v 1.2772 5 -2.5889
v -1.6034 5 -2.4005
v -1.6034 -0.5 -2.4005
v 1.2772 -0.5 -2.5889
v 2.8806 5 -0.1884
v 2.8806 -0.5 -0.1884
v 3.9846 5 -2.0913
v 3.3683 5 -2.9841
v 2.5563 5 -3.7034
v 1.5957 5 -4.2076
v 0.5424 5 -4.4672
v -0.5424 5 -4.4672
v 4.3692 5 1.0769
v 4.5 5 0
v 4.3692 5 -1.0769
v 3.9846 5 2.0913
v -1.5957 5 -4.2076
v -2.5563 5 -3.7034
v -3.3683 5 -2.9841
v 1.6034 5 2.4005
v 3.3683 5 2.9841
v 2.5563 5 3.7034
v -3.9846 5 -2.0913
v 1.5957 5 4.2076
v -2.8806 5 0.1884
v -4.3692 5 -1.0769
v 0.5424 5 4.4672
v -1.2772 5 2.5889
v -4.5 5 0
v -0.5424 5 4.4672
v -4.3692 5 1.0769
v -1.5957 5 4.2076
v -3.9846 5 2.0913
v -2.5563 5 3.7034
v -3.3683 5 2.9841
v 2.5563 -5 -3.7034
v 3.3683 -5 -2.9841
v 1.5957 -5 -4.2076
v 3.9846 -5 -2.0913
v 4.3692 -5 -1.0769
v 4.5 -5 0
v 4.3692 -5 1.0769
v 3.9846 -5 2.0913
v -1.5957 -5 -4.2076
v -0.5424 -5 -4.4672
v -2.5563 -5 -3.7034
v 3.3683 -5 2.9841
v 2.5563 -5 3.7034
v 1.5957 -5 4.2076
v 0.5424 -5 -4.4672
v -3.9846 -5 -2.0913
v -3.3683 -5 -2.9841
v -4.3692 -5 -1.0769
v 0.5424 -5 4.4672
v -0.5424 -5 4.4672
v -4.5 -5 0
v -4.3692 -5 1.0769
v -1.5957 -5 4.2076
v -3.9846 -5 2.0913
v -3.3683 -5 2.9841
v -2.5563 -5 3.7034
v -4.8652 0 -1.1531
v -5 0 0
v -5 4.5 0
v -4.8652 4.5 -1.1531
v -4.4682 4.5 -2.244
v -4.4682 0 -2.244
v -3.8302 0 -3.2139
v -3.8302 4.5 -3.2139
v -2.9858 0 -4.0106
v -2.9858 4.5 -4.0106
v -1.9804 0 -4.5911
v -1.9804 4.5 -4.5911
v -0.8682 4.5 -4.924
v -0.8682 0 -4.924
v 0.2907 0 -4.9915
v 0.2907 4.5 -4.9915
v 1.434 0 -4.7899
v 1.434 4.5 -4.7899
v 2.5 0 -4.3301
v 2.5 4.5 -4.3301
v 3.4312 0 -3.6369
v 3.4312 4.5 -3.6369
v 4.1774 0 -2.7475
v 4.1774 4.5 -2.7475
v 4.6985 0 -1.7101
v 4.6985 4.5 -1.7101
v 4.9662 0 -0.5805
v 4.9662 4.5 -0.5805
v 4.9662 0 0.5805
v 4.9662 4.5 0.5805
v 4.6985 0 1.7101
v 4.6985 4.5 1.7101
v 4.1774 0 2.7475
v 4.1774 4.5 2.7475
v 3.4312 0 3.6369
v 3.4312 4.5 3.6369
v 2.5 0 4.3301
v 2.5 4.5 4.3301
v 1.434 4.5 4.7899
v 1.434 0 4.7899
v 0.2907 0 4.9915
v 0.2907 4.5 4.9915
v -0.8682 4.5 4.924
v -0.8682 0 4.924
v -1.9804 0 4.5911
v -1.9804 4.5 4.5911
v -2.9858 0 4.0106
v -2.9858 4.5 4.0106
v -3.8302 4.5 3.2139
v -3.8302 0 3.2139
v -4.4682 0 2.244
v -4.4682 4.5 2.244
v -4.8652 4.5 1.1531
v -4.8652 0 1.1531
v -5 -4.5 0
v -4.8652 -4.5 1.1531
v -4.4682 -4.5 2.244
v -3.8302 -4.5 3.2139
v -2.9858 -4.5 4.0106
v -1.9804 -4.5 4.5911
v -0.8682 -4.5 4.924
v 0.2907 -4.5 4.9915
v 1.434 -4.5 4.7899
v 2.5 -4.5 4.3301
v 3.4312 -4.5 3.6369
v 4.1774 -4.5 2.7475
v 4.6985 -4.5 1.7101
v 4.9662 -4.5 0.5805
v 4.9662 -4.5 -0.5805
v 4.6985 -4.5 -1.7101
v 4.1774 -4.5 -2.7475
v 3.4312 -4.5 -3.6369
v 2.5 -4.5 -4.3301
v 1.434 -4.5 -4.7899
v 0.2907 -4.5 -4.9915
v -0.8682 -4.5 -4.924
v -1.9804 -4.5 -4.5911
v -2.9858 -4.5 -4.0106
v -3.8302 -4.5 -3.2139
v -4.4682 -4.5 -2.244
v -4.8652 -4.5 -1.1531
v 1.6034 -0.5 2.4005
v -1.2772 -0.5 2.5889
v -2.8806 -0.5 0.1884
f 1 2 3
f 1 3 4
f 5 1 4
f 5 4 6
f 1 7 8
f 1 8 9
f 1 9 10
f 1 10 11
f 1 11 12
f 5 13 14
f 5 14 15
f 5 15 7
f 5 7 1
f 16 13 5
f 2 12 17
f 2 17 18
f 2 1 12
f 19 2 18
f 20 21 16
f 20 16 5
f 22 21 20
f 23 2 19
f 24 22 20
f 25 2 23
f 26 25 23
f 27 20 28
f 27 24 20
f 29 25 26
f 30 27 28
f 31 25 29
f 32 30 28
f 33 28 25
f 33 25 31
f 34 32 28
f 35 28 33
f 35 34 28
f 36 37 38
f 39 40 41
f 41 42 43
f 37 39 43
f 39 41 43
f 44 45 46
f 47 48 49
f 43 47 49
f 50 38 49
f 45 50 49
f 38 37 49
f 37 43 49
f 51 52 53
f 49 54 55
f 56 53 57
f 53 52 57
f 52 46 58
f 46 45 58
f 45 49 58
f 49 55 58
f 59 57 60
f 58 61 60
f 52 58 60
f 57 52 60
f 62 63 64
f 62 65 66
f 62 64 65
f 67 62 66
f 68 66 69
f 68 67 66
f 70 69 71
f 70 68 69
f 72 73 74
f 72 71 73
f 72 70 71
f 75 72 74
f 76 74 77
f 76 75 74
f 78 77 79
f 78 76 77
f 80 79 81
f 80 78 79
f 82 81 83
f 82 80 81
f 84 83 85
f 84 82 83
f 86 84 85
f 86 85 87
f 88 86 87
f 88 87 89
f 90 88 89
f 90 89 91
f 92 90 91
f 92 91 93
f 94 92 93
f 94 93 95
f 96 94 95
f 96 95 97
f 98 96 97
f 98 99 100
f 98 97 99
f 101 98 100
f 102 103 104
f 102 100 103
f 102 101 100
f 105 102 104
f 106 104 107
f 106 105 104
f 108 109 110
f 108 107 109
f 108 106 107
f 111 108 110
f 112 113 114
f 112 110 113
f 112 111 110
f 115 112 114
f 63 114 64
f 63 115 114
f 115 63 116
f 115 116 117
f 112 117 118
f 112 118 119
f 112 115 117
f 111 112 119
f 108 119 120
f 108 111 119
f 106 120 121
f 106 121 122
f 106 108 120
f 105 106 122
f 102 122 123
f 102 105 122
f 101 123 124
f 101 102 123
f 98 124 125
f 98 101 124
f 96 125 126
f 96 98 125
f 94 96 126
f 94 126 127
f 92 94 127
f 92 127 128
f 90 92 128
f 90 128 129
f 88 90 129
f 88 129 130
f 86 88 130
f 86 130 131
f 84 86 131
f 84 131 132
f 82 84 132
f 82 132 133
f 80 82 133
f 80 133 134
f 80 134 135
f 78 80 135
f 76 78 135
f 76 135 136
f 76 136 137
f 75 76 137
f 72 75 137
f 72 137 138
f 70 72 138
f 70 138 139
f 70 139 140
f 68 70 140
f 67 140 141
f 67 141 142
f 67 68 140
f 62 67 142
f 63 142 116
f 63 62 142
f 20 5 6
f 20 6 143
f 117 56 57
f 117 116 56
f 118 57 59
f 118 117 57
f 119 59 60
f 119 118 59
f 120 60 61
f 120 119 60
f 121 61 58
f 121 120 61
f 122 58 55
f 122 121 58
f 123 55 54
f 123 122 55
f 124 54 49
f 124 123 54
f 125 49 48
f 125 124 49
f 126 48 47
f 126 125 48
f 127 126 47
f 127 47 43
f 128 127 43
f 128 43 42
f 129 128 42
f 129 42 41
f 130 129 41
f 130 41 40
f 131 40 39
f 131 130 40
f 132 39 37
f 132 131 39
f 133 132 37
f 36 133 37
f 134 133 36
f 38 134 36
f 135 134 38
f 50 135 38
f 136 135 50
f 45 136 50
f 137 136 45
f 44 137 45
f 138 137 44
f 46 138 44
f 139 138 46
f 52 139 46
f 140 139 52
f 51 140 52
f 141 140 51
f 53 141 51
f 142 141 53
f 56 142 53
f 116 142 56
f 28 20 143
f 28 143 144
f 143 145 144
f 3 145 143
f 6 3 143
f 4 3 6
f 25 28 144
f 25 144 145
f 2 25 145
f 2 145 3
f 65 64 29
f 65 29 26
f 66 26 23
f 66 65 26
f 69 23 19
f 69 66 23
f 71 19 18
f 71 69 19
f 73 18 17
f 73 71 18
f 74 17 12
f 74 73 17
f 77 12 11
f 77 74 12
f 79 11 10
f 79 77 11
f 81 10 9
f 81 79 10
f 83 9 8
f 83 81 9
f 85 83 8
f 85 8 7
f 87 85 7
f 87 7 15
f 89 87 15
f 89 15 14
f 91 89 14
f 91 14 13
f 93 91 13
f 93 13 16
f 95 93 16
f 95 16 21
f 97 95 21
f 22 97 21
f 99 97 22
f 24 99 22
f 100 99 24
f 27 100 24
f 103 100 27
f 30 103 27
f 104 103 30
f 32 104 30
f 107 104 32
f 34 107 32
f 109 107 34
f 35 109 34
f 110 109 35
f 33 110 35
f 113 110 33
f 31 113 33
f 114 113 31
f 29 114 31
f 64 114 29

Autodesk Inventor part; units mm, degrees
ref_plane "YZ Plane" through (0, 0, 0) normal (1, 0, 0) x (0, 1, 0)
ref_plane "XZ Plane" through (0, 0, 0) normal (0, 1, 0) x (-1, 0, 0)
ref_plane "XY Plane" through (0, 0, 0) normal (0, 0, 1) x (1, 0, 0)
sketch "Sketch1" plane through (0, 0, 0) normal (0, 1, 0) x (-1, 0, 0)
  circle A0 centre (0, 0) radius 5
  dimension "d3" = 10
extrude "Extrusion1" add sketch "Sketch1" along normal mid plane 10
sketch "Sketch2" plane through (0, 5, 0) normal (0, 1, 0) x (1, 0, 0)
  line L0 (1.2772, 2.5889) -> (2.8806, 0.1884)
  line L1 (2.8806, 0.1884) -> (1.6034, -2.4005)
  line L2 (1.6034, -2.4005) -> (-1.2772, -2.5889)
  line L3 (-1.2772, -2.5889) -> (-2.8806, -0.1884)
  line L4 (-2.8806, -0.1884) -> (-1.6034, 2.4005)
  line L5 (-1.6034, 2.4005) -> (1.2772, 2.5889)
  point P0 (0, 0)
  point P1 (0, 0)
  dimension "d2" = 5
extrude "Extrusion2" cut sketch "Sketch2" against normal blind 5.5
thread "Thread1" size "M10x1.5" class "6g" standard "ANSI Metric M Profile" length 10
chamfer "Chamfer1" distance 0.5 angle 45 2 edges at (5, 5, 0) (5, -5, 0)
properties part number "M10_HEX"
